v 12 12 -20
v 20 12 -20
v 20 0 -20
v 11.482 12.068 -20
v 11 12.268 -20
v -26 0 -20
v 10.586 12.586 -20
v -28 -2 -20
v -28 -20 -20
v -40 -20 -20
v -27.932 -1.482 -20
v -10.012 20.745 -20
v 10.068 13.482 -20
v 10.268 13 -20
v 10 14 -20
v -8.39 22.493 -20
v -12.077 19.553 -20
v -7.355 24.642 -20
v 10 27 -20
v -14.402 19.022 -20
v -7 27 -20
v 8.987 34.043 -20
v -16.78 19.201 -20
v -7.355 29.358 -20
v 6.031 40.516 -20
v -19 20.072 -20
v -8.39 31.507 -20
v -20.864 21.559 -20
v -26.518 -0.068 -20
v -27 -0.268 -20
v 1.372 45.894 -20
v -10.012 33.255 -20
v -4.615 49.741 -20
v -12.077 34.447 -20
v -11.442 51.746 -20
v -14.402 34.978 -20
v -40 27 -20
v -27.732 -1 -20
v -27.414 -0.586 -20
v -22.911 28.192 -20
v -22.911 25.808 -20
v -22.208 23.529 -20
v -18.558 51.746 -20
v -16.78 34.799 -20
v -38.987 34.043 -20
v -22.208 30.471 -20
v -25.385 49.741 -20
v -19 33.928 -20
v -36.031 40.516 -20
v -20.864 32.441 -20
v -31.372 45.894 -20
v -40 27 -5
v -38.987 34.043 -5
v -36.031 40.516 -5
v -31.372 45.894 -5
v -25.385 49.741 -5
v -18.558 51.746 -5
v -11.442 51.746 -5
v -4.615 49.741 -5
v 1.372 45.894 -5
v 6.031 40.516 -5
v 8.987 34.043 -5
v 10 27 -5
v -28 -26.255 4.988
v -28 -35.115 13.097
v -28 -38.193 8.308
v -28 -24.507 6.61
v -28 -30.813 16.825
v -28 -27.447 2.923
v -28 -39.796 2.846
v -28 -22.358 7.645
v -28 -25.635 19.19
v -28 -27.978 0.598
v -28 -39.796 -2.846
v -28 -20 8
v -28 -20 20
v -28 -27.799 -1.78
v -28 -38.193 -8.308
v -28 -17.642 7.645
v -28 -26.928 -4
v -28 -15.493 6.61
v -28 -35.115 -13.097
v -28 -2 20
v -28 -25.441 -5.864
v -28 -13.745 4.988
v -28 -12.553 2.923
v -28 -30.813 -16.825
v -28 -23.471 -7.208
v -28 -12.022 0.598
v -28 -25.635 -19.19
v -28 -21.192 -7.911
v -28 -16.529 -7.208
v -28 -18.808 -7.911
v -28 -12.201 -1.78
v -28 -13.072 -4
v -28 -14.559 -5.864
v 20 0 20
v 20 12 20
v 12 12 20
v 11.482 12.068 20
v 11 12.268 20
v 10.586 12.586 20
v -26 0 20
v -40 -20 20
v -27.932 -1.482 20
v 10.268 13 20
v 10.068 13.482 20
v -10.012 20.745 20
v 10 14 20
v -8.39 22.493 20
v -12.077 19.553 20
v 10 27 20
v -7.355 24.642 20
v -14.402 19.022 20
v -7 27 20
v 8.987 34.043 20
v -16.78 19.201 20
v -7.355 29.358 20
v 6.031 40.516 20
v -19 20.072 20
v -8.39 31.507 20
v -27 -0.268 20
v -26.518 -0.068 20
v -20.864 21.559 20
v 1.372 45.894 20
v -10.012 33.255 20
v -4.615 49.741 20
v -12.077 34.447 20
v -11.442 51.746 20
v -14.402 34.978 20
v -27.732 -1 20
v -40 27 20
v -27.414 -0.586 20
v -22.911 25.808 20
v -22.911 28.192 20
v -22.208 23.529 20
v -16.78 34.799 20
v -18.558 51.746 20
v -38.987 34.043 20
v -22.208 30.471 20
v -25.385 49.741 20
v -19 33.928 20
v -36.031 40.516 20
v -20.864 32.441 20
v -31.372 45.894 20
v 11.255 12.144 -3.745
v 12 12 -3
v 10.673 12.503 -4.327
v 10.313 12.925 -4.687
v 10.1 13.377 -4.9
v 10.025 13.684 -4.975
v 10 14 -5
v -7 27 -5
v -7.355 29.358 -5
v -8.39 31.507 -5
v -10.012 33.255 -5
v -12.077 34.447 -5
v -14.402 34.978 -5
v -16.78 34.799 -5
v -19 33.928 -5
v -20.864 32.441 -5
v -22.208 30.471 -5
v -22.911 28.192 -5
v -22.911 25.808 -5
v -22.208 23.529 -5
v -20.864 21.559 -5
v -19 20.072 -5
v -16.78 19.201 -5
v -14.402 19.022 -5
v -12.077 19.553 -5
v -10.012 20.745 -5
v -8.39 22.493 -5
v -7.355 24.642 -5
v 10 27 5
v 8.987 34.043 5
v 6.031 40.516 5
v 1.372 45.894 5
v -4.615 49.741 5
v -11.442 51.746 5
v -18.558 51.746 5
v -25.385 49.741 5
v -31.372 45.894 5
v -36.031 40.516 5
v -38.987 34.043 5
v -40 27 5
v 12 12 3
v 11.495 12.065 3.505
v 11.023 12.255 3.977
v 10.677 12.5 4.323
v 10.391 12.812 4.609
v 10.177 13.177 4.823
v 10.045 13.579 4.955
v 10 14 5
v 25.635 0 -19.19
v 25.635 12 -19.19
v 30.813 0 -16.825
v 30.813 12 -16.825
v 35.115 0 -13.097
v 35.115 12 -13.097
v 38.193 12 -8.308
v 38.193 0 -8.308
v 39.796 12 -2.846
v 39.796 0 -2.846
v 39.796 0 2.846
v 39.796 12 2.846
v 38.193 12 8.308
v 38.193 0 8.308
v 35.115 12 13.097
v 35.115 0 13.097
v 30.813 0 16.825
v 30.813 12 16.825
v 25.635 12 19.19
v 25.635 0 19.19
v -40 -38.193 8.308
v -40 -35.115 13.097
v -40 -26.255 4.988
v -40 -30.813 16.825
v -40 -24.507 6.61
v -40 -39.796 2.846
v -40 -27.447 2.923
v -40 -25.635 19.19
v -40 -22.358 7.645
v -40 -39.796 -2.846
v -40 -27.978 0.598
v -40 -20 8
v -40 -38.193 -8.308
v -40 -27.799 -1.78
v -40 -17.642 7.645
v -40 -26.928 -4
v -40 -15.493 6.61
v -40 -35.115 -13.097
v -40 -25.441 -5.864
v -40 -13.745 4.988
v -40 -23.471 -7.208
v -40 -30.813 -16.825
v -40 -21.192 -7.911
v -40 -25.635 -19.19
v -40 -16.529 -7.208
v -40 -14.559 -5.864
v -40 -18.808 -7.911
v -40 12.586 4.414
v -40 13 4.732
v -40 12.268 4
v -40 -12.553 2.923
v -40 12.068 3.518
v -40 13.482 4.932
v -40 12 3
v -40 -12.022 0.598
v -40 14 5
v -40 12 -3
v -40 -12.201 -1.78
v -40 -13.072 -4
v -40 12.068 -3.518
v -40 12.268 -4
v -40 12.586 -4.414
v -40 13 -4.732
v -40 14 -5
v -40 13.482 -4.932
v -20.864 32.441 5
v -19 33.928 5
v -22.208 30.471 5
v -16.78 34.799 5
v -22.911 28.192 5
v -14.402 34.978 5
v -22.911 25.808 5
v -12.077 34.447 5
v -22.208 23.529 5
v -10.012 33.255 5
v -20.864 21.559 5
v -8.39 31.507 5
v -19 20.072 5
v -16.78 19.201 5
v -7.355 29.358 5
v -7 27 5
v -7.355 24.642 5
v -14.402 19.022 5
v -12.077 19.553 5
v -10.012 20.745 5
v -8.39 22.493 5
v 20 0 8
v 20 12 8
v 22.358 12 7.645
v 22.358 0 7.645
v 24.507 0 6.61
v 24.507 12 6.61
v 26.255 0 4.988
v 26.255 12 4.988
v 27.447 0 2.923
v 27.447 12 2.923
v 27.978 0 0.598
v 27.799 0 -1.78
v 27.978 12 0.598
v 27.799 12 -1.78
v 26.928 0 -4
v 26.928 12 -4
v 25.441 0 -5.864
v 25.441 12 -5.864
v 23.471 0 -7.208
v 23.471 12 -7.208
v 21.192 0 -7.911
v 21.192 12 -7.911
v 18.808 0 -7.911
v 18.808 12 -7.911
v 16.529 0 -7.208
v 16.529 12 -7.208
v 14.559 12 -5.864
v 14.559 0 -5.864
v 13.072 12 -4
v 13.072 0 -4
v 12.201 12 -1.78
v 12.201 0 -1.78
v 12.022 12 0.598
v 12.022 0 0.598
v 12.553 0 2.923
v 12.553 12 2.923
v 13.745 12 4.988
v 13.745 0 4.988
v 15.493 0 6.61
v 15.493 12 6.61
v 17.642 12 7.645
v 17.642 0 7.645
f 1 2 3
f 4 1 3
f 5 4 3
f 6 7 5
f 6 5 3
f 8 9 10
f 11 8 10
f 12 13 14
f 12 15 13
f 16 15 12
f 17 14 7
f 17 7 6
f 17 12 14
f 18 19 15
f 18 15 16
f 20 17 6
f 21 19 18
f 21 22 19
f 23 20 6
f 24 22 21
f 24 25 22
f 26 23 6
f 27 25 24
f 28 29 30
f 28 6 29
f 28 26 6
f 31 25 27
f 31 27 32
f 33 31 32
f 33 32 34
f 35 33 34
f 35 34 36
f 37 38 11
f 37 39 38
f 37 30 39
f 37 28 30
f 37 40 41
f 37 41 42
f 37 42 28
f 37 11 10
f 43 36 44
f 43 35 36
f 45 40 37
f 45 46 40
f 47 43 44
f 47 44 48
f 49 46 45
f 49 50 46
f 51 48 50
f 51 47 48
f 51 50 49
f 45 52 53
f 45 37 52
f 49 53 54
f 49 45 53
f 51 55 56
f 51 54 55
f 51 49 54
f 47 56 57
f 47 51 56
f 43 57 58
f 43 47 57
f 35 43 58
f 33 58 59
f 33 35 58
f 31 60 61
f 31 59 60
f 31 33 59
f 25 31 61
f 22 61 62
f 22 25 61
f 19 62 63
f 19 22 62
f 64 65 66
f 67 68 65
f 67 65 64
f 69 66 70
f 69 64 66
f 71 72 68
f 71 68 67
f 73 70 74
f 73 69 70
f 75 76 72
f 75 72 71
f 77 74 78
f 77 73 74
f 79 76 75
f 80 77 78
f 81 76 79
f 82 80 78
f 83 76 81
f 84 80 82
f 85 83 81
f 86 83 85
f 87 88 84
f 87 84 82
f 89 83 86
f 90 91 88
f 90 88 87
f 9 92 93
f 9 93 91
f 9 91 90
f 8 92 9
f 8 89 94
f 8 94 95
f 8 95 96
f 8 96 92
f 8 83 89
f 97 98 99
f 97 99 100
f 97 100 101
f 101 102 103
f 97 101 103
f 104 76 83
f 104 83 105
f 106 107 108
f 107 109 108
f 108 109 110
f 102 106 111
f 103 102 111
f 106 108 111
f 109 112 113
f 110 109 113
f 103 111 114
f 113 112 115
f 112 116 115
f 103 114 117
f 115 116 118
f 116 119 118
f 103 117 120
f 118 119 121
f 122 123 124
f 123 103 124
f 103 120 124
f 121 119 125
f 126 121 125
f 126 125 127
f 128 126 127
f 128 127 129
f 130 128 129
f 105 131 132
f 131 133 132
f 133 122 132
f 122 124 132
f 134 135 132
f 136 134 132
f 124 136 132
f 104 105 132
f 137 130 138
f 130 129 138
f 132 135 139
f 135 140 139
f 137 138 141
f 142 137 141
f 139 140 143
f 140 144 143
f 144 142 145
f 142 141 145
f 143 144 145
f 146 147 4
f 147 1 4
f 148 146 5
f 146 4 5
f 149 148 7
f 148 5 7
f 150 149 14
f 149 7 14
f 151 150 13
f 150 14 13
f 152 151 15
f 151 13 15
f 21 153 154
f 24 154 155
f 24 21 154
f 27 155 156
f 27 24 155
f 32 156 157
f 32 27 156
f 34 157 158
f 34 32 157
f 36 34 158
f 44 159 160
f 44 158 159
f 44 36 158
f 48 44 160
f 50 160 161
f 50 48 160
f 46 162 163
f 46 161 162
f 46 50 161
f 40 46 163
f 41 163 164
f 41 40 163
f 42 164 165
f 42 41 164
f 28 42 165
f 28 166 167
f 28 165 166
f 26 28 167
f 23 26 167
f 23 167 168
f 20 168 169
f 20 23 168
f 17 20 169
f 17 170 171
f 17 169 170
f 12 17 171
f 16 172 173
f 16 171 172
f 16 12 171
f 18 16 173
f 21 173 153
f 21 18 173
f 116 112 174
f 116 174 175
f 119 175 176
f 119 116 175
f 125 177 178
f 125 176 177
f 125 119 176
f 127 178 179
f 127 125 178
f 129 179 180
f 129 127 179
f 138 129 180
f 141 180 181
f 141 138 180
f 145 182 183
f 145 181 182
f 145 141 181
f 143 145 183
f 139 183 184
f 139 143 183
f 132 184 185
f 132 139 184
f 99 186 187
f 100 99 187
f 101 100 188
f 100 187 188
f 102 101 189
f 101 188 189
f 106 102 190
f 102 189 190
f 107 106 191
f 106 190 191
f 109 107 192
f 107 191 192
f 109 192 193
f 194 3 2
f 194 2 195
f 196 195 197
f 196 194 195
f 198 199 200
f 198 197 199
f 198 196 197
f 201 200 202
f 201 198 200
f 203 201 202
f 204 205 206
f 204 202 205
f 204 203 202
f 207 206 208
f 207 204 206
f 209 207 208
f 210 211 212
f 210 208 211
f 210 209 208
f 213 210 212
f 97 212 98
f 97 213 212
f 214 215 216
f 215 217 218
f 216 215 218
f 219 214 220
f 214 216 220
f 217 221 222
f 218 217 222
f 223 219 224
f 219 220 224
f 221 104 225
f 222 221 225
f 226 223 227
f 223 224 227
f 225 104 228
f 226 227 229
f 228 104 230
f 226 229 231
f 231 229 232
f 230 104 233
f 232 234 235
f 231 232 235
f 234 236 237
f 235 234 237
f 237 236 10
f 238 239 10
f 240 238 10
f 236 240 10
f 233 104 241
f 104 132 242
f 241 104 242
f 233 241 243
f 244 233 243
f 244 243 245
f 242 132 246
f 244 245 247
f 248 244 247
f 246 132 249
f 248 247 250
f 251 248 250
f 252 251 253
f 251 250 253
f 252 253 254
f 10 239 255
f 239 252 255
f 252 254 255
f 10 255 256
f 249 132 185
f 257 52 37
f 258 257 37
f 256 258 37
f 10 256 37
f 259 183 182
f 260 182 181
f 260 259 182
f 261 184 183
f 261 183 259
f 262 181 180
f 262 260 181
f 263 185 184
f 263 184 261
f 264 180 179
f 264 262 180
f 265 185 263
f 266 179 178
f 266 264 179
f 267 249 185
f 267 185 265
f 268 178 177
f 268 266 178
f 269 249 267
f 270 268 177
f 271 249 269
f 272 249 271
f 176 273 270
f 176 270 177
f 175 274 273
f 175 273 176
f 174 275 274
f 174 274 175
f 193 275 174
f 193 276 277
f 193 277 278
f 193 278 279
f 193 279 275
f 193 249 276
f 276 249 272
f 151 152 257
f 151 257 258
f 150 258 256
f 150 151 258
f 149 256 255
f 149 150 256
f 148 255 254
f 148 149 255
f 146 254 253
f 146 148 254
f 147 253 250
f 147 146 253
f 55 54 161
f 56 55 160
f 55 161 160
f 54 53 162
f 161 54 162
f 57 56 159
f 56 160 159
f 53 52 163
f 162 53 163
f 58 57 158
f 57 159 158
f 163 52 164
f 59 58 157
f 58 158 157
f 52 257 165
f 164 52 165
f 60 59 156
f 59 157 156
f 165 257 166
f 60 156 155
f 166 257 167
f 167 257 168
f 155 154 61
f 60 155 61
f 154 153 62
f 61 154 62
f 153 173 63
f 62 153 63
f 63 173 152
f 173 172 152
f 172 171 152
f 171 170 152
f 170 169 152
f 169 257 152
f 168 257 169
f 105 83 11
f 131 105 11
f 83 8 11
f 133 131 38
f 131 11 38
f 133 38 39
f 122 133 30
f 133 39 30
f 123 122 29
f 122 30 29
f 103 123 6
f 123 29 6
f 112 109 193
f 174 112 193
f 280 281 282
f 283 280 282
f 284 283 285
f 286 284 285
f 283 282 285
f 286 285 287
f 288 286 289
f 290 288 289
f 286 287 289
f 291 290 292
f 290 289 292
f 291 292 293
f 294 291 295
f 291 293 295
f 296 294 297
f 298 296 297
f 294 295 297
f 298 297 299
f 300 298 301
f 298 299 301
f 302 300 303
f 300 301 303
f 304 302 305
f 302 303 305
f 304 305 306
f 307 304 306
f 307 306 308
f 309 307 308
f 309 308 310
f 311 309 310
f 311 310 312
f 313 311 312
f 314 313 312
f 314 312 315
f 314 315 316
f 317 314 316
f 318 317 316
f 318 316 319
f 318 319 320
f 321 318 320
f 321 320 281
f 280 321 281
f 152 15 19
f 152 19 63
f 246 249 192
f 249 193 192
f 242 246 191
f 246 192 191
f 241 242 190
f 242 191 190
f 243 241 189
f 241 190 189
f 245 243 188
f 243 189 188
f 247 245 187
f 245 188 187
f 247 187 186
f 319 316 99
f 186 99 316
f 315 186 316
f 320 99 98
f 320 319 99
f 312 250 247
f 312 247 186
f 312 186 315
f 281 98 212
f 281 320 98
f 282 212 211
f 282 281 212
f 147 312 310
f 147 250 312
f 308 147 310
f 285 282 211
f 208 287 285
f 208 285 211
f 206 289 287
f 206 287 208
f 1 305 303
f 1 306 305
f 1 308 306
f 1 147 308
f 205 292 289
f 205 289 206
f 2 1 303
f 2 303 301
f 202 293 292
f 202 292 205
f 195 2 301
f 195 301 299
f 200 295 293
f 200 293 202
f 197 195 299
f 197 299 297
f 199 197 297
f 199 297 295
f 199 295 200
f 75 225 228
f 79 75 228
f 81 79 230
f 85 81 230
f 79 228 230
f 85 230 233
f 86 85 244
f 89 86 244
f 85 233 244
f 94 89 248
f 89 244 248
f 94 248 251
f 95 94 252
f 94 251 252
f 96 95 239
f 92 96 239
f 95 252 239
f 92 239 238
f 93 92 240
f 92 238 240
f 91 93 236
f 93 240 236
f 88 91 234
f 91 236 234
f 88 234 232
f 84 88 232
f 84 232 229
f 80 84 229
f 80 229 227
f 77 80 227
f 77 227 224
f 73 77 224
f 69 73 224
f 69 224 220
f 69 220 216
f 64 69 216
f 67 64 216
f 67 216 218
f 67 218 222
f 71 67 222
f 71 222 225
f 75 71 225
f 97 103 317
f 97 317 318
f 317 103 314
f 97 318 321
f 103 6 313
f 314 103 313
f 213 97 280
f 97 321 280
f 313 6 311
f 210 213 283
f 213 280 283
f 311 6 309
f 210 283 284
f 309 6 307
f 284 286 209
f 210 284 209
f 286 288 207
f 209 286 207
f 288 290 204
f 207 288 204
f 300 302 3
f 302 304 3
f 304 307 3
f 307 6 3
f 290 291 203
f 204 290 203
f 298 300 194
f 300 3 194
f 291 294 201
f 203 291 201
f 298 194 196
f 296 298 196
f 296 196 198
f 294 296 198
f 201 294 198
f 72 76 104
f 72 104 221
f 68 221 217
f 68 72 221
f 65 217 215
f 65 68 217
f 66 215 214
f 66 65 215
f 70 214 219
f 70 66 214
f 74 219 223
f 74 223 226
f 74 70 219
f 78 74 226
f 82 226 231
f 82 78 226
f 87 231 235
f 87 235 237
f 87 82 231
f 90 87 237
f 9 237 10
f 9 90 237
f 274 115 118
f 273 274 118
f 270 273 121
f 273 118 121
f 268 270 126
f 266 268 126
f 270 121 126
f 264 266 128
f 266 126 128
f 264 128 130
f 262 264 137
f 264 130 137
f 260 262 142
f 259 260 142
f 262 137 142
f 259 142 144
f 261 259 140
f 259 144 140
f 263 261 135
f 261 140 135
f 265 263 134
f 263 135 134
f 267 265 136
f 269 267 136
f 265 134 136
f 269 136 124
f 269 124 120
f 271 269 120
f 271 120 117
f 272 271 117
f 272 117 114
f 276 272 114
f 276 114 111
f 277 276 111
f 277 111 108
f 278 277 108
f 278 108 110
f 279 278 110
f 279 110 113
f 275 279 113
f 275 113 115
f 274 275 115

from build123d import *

# Parameters (mm, degrees)
SKETCH1_W                   = 80
SKETCH1_H                   = 40
BOSS_EXTRUDE1_DEPTH         = 12
FILLET1_RADIUS              = 20
FILLET1_LENGTH              = 12
SKETCH2_W                   = 50
SKETCH2_H                   = 15
BOSS_EXTRUDE2_DEPTH         = 40
FILLET3_RADIUS              = 25
FILLET3_LENGTH              = 15
SKETCH4_R                   = 8
CUT_EXTRUDE2_DEPTH          = 40
FILLET3_OF_MIRROR7_2_RADIUS = 25
FILLET3_OF_MIRROR7_2_LENGTH = 15
SKETCH5_R                   = 8
CUT_EXTRUDE4_DEPTH          = 40
SKETCH7_W                   = 12
SKETCH7_H                   = 40
BOSS_EXTRUDE3_DEPTH         = 40
FILLET4_RADIUS              = 20
FILLET4_LENGTH              = 12
SKETCH8_R                   = 8
CUT_EXTRUDE5_DEPTH          = 40
FILLET6_R                   = 2
FILLET7_R                   = 2
FILLET8_R                   = 2
FILLET9_R                   = 2
FILLET10_R                  = 2


with BuildPart() as part:
    # Sketch1 → Boss-Extrude1 (new body)
    with BuildSketch(Plane(origin=(0, 0, 0), x_dir=(1, 0, 0), z_dir=(0, 1, 0))):
        Rectangle(SKETCH1_W, SKETCH1_H)
    extrude(amount=BOSS_EXTRUDE1_DEPTH)

    # Fillet1: full round fillet: the end face becomes a half cylinder, R = half its width
    fillet1_face = Plane((40, 6, 0), x_dir=(0, -1, 0), z_dir=(1, 0, 0))  # on the end face: x along it, z out of the body
    fillet1_slab = fillet1_face.offset(-FILLET1_RADIUS / 2) * Box(FILLET1_LENGTH, 2 * FILLET1_RADIUS, FILLET1_RADIUS, mode=Mode.PRIVATE)  # the body's end, R deep
    fillet1_round = Plane((20, 6, 0), x_dir=(1, 0, 0), z_dir=(0, -1, 0)) * Cylinder(FILLET1_RADIUS, FILLET1_LENGTH, mode=Mode.PRIVATE)  # its axis R under the face
    add(fillet1_slab - fillet1_round, mode=Mode.SUBTRACT)

    # Sketch2 → Boss-Extrude2 (add)
    with BuildSketch(Plane(origin=(0, 12, 0), x_dir=(1, 0, 0), z_dir=(0, 1, 0))):
        with Locations((-15, -12.5)):
            Rectangle(SKETCH2_W, SKETCH2_H)
    boss_extrude2 = extrude(amount=BOSS_EXTRUDE2_DEPTH)

    # Fillet3: full round fillet: the end face becomes a half cylinder, R = half its width
    fillet3_face = Plane((-15, 52, 12.5), x_dir=(0, 0, 1), z_dir=(0, 1, 0))  # on the end face: x along it, z out of the body
    fillet3_slab = fillet3_face.offset(-FILLET3_RADIUS / 2) * Box(FILLET3_LENGTH, 2 * FILLET3_RADIUS, FILLET3_RADIUS, mode=Mode.PRIVATE)  # the body's end, R deep
    fillet3_round = Plane((-15, 27, 12.5), x_dir=(0, 1, 0), z_dir=(0, 0, 1)) * Cylinder(FILLET3_RADIUS, FILLET3_LENGTH, mode=Mode.PRIVATE)  # its axis R under the face
    add(fillet3_slab - fillet3_round, mode=Mode.SUBTRACT)

    # Sketch4 → Cut-Extrude2 (cut)
    with BuildSketch(Plane.XY.offset(20)):
        with Locations((-15, 27)):
            Circle(SKETCH4_R)
    cut_extrude2 = extrude(amount=-CUT_EXTRUDE2_DEPTH, mode=Mode.SUBTRACT)

    # Mirror7: Boss-Extrude2, Cut-Extrude2 across plane
    add(boss_extrude2.mirror(Plane.XY))
    add(cut_extrude2.mirror(Plane.XY), mode=Mode.SUBTRACT)

    # Fillet3 of Mirror7 2: full round fillet: the end face becomes a half cylinder, R = half its width
    fillet3_of_mirror7_2_face = Plane((-15, 52, -12.5), x_dir=(0, 0, -1), z_dir=(0, 1, 0))  # on the end face: x along it, z out of the body
    fillet3_of_mirror7_2_slab = fillet3_of_mirror7_2_face.offset(-FILLET3_OF_MIRROR7_2_RADIUS / 2) * Box(FILLET3_OF_MIRROR7_2_LENGTH, 2 * FILLET3_OF_MIRROR7_2_RADIUS, FILLET3_OF_MIRROR7_2_RADIUS, mode=Mode.PRIVATE)  # the body's end, R deep
    fillet3_of_mirror7_2_round = Plane((-15, 27, -12.5), x_dir=(0, 1, 0), z_dir=(0, 0, -1)) * Cylinder(FILLET3_OF_MIRROR7_2_RADIUS, FILLET3_OF_MIRROR7_2_LENGTH, mode=Mode.PRIVATE)  # its axis R under the face
    add(fillet3_of_mirror7_2_slab - fillet3_of_mirror7_2_round, mode=Mode.SUBTRACT)

    # Sketch5 → Cut-Extrude4 (cut)
    with BuildSketch(Plane(origin=(0, 12, 0), x_dir=(1, 0, 0), z_dir=(0, 1, 0))):
        with Locations(Location((20, 0, 0), (0, 0, 270))):
            Circle(SKETCH5_R)
    extrude(amount=-CUT_EXTRUDE4_DEPTH, mode=Mode.SUBTRACT)

    # Sketch7 → Boss-Extrude3 (add)
    with BuildSketch(Plane(origin=(0, 0, 0), x_dir=(-1, 0, 0), z_dir=(0, -1, 0))):
        with Locations((34, 0)):
            Rectangle(SKETCH7_W, SKETCH7_H)
    extrude(amount=BOSS_EXTRUDE3_DEPTH)

    # Fillet4: full round fillet: the end face becomes a half cylinder, R = half its width
    fillet4_face = Plane((-34, -40, 0), x_dir=(1, 0, 0), z_dir=(0, -1, 0))  # on the end face: x along it, z out of the body
    fillet4_slab = fillet4_face.offset(-FILLET4_RADIUS / 2) * Box(FILLET4_LENGTH, 2 * FILLET4_RADIUS, FILLET4_RADIUS, mode=Mode.PRIVATE)  # the body's end, R deep
    fillet4_round = Plane((-34, -20, 0), x_dir=(0, -1, 0), z_dir=(1, 0, 0)) * Cylinder(FILLET4_RADIUS, FILLET4_LENGTH, mode=Mode.PRIVATE)  # its axis R under the face
    add(fillet4_slab - fillet4_round, mode=Mode.SUBTRACT)

    # Sketch8 → Cut-Extrude5 (cut)
    with BuildSketch(Plane.ZY.offset(40)):
        with Locations((0, -20)):
            Circle(SKETCH8_R)
    extrude(amount=-CUT_EXTRUDE5_DEPTH, mode=Mode.SUBTRACT)

    # Fillet6
    fillet6_edges = [part.edges().sort_by_distance(p)[0] for p in [
        (10, 12, 12.5),
    ]]
    fillet(fillet6_edges, radius=FILLET6_R)

    # Fillet7
    fillet7_edges = [part.edges().sort_by_distance(p)[0] for p in [
        (-14, 12, 5),
    ]]
    fillet(fillet7_edges, radius=FILLET7_R)

    # Fillet8
    fillet8_edges = [part.edges().sort_by_distance(p)[0] for p in [
        (-15, 12, -5),
    ]]
    fillet(fillet8_edges, radius=FILLET8_R)

    # Fillet9
    fillet9_edges = [part.edges().sort_by_distance(p)[0] for p in [
        (10, 12, -11.5),
    ]]
    fillet(fillet9_edges, radius=FILLET9_R)

    # Fillet10
    fillet10_edges = [part.edges().sort_by_distance(p)[0] for p in [
        (-28, 0, 0),
    ]]
    fillet(fillet10_edges, radius=FILLET10_R)


solid = part.part
